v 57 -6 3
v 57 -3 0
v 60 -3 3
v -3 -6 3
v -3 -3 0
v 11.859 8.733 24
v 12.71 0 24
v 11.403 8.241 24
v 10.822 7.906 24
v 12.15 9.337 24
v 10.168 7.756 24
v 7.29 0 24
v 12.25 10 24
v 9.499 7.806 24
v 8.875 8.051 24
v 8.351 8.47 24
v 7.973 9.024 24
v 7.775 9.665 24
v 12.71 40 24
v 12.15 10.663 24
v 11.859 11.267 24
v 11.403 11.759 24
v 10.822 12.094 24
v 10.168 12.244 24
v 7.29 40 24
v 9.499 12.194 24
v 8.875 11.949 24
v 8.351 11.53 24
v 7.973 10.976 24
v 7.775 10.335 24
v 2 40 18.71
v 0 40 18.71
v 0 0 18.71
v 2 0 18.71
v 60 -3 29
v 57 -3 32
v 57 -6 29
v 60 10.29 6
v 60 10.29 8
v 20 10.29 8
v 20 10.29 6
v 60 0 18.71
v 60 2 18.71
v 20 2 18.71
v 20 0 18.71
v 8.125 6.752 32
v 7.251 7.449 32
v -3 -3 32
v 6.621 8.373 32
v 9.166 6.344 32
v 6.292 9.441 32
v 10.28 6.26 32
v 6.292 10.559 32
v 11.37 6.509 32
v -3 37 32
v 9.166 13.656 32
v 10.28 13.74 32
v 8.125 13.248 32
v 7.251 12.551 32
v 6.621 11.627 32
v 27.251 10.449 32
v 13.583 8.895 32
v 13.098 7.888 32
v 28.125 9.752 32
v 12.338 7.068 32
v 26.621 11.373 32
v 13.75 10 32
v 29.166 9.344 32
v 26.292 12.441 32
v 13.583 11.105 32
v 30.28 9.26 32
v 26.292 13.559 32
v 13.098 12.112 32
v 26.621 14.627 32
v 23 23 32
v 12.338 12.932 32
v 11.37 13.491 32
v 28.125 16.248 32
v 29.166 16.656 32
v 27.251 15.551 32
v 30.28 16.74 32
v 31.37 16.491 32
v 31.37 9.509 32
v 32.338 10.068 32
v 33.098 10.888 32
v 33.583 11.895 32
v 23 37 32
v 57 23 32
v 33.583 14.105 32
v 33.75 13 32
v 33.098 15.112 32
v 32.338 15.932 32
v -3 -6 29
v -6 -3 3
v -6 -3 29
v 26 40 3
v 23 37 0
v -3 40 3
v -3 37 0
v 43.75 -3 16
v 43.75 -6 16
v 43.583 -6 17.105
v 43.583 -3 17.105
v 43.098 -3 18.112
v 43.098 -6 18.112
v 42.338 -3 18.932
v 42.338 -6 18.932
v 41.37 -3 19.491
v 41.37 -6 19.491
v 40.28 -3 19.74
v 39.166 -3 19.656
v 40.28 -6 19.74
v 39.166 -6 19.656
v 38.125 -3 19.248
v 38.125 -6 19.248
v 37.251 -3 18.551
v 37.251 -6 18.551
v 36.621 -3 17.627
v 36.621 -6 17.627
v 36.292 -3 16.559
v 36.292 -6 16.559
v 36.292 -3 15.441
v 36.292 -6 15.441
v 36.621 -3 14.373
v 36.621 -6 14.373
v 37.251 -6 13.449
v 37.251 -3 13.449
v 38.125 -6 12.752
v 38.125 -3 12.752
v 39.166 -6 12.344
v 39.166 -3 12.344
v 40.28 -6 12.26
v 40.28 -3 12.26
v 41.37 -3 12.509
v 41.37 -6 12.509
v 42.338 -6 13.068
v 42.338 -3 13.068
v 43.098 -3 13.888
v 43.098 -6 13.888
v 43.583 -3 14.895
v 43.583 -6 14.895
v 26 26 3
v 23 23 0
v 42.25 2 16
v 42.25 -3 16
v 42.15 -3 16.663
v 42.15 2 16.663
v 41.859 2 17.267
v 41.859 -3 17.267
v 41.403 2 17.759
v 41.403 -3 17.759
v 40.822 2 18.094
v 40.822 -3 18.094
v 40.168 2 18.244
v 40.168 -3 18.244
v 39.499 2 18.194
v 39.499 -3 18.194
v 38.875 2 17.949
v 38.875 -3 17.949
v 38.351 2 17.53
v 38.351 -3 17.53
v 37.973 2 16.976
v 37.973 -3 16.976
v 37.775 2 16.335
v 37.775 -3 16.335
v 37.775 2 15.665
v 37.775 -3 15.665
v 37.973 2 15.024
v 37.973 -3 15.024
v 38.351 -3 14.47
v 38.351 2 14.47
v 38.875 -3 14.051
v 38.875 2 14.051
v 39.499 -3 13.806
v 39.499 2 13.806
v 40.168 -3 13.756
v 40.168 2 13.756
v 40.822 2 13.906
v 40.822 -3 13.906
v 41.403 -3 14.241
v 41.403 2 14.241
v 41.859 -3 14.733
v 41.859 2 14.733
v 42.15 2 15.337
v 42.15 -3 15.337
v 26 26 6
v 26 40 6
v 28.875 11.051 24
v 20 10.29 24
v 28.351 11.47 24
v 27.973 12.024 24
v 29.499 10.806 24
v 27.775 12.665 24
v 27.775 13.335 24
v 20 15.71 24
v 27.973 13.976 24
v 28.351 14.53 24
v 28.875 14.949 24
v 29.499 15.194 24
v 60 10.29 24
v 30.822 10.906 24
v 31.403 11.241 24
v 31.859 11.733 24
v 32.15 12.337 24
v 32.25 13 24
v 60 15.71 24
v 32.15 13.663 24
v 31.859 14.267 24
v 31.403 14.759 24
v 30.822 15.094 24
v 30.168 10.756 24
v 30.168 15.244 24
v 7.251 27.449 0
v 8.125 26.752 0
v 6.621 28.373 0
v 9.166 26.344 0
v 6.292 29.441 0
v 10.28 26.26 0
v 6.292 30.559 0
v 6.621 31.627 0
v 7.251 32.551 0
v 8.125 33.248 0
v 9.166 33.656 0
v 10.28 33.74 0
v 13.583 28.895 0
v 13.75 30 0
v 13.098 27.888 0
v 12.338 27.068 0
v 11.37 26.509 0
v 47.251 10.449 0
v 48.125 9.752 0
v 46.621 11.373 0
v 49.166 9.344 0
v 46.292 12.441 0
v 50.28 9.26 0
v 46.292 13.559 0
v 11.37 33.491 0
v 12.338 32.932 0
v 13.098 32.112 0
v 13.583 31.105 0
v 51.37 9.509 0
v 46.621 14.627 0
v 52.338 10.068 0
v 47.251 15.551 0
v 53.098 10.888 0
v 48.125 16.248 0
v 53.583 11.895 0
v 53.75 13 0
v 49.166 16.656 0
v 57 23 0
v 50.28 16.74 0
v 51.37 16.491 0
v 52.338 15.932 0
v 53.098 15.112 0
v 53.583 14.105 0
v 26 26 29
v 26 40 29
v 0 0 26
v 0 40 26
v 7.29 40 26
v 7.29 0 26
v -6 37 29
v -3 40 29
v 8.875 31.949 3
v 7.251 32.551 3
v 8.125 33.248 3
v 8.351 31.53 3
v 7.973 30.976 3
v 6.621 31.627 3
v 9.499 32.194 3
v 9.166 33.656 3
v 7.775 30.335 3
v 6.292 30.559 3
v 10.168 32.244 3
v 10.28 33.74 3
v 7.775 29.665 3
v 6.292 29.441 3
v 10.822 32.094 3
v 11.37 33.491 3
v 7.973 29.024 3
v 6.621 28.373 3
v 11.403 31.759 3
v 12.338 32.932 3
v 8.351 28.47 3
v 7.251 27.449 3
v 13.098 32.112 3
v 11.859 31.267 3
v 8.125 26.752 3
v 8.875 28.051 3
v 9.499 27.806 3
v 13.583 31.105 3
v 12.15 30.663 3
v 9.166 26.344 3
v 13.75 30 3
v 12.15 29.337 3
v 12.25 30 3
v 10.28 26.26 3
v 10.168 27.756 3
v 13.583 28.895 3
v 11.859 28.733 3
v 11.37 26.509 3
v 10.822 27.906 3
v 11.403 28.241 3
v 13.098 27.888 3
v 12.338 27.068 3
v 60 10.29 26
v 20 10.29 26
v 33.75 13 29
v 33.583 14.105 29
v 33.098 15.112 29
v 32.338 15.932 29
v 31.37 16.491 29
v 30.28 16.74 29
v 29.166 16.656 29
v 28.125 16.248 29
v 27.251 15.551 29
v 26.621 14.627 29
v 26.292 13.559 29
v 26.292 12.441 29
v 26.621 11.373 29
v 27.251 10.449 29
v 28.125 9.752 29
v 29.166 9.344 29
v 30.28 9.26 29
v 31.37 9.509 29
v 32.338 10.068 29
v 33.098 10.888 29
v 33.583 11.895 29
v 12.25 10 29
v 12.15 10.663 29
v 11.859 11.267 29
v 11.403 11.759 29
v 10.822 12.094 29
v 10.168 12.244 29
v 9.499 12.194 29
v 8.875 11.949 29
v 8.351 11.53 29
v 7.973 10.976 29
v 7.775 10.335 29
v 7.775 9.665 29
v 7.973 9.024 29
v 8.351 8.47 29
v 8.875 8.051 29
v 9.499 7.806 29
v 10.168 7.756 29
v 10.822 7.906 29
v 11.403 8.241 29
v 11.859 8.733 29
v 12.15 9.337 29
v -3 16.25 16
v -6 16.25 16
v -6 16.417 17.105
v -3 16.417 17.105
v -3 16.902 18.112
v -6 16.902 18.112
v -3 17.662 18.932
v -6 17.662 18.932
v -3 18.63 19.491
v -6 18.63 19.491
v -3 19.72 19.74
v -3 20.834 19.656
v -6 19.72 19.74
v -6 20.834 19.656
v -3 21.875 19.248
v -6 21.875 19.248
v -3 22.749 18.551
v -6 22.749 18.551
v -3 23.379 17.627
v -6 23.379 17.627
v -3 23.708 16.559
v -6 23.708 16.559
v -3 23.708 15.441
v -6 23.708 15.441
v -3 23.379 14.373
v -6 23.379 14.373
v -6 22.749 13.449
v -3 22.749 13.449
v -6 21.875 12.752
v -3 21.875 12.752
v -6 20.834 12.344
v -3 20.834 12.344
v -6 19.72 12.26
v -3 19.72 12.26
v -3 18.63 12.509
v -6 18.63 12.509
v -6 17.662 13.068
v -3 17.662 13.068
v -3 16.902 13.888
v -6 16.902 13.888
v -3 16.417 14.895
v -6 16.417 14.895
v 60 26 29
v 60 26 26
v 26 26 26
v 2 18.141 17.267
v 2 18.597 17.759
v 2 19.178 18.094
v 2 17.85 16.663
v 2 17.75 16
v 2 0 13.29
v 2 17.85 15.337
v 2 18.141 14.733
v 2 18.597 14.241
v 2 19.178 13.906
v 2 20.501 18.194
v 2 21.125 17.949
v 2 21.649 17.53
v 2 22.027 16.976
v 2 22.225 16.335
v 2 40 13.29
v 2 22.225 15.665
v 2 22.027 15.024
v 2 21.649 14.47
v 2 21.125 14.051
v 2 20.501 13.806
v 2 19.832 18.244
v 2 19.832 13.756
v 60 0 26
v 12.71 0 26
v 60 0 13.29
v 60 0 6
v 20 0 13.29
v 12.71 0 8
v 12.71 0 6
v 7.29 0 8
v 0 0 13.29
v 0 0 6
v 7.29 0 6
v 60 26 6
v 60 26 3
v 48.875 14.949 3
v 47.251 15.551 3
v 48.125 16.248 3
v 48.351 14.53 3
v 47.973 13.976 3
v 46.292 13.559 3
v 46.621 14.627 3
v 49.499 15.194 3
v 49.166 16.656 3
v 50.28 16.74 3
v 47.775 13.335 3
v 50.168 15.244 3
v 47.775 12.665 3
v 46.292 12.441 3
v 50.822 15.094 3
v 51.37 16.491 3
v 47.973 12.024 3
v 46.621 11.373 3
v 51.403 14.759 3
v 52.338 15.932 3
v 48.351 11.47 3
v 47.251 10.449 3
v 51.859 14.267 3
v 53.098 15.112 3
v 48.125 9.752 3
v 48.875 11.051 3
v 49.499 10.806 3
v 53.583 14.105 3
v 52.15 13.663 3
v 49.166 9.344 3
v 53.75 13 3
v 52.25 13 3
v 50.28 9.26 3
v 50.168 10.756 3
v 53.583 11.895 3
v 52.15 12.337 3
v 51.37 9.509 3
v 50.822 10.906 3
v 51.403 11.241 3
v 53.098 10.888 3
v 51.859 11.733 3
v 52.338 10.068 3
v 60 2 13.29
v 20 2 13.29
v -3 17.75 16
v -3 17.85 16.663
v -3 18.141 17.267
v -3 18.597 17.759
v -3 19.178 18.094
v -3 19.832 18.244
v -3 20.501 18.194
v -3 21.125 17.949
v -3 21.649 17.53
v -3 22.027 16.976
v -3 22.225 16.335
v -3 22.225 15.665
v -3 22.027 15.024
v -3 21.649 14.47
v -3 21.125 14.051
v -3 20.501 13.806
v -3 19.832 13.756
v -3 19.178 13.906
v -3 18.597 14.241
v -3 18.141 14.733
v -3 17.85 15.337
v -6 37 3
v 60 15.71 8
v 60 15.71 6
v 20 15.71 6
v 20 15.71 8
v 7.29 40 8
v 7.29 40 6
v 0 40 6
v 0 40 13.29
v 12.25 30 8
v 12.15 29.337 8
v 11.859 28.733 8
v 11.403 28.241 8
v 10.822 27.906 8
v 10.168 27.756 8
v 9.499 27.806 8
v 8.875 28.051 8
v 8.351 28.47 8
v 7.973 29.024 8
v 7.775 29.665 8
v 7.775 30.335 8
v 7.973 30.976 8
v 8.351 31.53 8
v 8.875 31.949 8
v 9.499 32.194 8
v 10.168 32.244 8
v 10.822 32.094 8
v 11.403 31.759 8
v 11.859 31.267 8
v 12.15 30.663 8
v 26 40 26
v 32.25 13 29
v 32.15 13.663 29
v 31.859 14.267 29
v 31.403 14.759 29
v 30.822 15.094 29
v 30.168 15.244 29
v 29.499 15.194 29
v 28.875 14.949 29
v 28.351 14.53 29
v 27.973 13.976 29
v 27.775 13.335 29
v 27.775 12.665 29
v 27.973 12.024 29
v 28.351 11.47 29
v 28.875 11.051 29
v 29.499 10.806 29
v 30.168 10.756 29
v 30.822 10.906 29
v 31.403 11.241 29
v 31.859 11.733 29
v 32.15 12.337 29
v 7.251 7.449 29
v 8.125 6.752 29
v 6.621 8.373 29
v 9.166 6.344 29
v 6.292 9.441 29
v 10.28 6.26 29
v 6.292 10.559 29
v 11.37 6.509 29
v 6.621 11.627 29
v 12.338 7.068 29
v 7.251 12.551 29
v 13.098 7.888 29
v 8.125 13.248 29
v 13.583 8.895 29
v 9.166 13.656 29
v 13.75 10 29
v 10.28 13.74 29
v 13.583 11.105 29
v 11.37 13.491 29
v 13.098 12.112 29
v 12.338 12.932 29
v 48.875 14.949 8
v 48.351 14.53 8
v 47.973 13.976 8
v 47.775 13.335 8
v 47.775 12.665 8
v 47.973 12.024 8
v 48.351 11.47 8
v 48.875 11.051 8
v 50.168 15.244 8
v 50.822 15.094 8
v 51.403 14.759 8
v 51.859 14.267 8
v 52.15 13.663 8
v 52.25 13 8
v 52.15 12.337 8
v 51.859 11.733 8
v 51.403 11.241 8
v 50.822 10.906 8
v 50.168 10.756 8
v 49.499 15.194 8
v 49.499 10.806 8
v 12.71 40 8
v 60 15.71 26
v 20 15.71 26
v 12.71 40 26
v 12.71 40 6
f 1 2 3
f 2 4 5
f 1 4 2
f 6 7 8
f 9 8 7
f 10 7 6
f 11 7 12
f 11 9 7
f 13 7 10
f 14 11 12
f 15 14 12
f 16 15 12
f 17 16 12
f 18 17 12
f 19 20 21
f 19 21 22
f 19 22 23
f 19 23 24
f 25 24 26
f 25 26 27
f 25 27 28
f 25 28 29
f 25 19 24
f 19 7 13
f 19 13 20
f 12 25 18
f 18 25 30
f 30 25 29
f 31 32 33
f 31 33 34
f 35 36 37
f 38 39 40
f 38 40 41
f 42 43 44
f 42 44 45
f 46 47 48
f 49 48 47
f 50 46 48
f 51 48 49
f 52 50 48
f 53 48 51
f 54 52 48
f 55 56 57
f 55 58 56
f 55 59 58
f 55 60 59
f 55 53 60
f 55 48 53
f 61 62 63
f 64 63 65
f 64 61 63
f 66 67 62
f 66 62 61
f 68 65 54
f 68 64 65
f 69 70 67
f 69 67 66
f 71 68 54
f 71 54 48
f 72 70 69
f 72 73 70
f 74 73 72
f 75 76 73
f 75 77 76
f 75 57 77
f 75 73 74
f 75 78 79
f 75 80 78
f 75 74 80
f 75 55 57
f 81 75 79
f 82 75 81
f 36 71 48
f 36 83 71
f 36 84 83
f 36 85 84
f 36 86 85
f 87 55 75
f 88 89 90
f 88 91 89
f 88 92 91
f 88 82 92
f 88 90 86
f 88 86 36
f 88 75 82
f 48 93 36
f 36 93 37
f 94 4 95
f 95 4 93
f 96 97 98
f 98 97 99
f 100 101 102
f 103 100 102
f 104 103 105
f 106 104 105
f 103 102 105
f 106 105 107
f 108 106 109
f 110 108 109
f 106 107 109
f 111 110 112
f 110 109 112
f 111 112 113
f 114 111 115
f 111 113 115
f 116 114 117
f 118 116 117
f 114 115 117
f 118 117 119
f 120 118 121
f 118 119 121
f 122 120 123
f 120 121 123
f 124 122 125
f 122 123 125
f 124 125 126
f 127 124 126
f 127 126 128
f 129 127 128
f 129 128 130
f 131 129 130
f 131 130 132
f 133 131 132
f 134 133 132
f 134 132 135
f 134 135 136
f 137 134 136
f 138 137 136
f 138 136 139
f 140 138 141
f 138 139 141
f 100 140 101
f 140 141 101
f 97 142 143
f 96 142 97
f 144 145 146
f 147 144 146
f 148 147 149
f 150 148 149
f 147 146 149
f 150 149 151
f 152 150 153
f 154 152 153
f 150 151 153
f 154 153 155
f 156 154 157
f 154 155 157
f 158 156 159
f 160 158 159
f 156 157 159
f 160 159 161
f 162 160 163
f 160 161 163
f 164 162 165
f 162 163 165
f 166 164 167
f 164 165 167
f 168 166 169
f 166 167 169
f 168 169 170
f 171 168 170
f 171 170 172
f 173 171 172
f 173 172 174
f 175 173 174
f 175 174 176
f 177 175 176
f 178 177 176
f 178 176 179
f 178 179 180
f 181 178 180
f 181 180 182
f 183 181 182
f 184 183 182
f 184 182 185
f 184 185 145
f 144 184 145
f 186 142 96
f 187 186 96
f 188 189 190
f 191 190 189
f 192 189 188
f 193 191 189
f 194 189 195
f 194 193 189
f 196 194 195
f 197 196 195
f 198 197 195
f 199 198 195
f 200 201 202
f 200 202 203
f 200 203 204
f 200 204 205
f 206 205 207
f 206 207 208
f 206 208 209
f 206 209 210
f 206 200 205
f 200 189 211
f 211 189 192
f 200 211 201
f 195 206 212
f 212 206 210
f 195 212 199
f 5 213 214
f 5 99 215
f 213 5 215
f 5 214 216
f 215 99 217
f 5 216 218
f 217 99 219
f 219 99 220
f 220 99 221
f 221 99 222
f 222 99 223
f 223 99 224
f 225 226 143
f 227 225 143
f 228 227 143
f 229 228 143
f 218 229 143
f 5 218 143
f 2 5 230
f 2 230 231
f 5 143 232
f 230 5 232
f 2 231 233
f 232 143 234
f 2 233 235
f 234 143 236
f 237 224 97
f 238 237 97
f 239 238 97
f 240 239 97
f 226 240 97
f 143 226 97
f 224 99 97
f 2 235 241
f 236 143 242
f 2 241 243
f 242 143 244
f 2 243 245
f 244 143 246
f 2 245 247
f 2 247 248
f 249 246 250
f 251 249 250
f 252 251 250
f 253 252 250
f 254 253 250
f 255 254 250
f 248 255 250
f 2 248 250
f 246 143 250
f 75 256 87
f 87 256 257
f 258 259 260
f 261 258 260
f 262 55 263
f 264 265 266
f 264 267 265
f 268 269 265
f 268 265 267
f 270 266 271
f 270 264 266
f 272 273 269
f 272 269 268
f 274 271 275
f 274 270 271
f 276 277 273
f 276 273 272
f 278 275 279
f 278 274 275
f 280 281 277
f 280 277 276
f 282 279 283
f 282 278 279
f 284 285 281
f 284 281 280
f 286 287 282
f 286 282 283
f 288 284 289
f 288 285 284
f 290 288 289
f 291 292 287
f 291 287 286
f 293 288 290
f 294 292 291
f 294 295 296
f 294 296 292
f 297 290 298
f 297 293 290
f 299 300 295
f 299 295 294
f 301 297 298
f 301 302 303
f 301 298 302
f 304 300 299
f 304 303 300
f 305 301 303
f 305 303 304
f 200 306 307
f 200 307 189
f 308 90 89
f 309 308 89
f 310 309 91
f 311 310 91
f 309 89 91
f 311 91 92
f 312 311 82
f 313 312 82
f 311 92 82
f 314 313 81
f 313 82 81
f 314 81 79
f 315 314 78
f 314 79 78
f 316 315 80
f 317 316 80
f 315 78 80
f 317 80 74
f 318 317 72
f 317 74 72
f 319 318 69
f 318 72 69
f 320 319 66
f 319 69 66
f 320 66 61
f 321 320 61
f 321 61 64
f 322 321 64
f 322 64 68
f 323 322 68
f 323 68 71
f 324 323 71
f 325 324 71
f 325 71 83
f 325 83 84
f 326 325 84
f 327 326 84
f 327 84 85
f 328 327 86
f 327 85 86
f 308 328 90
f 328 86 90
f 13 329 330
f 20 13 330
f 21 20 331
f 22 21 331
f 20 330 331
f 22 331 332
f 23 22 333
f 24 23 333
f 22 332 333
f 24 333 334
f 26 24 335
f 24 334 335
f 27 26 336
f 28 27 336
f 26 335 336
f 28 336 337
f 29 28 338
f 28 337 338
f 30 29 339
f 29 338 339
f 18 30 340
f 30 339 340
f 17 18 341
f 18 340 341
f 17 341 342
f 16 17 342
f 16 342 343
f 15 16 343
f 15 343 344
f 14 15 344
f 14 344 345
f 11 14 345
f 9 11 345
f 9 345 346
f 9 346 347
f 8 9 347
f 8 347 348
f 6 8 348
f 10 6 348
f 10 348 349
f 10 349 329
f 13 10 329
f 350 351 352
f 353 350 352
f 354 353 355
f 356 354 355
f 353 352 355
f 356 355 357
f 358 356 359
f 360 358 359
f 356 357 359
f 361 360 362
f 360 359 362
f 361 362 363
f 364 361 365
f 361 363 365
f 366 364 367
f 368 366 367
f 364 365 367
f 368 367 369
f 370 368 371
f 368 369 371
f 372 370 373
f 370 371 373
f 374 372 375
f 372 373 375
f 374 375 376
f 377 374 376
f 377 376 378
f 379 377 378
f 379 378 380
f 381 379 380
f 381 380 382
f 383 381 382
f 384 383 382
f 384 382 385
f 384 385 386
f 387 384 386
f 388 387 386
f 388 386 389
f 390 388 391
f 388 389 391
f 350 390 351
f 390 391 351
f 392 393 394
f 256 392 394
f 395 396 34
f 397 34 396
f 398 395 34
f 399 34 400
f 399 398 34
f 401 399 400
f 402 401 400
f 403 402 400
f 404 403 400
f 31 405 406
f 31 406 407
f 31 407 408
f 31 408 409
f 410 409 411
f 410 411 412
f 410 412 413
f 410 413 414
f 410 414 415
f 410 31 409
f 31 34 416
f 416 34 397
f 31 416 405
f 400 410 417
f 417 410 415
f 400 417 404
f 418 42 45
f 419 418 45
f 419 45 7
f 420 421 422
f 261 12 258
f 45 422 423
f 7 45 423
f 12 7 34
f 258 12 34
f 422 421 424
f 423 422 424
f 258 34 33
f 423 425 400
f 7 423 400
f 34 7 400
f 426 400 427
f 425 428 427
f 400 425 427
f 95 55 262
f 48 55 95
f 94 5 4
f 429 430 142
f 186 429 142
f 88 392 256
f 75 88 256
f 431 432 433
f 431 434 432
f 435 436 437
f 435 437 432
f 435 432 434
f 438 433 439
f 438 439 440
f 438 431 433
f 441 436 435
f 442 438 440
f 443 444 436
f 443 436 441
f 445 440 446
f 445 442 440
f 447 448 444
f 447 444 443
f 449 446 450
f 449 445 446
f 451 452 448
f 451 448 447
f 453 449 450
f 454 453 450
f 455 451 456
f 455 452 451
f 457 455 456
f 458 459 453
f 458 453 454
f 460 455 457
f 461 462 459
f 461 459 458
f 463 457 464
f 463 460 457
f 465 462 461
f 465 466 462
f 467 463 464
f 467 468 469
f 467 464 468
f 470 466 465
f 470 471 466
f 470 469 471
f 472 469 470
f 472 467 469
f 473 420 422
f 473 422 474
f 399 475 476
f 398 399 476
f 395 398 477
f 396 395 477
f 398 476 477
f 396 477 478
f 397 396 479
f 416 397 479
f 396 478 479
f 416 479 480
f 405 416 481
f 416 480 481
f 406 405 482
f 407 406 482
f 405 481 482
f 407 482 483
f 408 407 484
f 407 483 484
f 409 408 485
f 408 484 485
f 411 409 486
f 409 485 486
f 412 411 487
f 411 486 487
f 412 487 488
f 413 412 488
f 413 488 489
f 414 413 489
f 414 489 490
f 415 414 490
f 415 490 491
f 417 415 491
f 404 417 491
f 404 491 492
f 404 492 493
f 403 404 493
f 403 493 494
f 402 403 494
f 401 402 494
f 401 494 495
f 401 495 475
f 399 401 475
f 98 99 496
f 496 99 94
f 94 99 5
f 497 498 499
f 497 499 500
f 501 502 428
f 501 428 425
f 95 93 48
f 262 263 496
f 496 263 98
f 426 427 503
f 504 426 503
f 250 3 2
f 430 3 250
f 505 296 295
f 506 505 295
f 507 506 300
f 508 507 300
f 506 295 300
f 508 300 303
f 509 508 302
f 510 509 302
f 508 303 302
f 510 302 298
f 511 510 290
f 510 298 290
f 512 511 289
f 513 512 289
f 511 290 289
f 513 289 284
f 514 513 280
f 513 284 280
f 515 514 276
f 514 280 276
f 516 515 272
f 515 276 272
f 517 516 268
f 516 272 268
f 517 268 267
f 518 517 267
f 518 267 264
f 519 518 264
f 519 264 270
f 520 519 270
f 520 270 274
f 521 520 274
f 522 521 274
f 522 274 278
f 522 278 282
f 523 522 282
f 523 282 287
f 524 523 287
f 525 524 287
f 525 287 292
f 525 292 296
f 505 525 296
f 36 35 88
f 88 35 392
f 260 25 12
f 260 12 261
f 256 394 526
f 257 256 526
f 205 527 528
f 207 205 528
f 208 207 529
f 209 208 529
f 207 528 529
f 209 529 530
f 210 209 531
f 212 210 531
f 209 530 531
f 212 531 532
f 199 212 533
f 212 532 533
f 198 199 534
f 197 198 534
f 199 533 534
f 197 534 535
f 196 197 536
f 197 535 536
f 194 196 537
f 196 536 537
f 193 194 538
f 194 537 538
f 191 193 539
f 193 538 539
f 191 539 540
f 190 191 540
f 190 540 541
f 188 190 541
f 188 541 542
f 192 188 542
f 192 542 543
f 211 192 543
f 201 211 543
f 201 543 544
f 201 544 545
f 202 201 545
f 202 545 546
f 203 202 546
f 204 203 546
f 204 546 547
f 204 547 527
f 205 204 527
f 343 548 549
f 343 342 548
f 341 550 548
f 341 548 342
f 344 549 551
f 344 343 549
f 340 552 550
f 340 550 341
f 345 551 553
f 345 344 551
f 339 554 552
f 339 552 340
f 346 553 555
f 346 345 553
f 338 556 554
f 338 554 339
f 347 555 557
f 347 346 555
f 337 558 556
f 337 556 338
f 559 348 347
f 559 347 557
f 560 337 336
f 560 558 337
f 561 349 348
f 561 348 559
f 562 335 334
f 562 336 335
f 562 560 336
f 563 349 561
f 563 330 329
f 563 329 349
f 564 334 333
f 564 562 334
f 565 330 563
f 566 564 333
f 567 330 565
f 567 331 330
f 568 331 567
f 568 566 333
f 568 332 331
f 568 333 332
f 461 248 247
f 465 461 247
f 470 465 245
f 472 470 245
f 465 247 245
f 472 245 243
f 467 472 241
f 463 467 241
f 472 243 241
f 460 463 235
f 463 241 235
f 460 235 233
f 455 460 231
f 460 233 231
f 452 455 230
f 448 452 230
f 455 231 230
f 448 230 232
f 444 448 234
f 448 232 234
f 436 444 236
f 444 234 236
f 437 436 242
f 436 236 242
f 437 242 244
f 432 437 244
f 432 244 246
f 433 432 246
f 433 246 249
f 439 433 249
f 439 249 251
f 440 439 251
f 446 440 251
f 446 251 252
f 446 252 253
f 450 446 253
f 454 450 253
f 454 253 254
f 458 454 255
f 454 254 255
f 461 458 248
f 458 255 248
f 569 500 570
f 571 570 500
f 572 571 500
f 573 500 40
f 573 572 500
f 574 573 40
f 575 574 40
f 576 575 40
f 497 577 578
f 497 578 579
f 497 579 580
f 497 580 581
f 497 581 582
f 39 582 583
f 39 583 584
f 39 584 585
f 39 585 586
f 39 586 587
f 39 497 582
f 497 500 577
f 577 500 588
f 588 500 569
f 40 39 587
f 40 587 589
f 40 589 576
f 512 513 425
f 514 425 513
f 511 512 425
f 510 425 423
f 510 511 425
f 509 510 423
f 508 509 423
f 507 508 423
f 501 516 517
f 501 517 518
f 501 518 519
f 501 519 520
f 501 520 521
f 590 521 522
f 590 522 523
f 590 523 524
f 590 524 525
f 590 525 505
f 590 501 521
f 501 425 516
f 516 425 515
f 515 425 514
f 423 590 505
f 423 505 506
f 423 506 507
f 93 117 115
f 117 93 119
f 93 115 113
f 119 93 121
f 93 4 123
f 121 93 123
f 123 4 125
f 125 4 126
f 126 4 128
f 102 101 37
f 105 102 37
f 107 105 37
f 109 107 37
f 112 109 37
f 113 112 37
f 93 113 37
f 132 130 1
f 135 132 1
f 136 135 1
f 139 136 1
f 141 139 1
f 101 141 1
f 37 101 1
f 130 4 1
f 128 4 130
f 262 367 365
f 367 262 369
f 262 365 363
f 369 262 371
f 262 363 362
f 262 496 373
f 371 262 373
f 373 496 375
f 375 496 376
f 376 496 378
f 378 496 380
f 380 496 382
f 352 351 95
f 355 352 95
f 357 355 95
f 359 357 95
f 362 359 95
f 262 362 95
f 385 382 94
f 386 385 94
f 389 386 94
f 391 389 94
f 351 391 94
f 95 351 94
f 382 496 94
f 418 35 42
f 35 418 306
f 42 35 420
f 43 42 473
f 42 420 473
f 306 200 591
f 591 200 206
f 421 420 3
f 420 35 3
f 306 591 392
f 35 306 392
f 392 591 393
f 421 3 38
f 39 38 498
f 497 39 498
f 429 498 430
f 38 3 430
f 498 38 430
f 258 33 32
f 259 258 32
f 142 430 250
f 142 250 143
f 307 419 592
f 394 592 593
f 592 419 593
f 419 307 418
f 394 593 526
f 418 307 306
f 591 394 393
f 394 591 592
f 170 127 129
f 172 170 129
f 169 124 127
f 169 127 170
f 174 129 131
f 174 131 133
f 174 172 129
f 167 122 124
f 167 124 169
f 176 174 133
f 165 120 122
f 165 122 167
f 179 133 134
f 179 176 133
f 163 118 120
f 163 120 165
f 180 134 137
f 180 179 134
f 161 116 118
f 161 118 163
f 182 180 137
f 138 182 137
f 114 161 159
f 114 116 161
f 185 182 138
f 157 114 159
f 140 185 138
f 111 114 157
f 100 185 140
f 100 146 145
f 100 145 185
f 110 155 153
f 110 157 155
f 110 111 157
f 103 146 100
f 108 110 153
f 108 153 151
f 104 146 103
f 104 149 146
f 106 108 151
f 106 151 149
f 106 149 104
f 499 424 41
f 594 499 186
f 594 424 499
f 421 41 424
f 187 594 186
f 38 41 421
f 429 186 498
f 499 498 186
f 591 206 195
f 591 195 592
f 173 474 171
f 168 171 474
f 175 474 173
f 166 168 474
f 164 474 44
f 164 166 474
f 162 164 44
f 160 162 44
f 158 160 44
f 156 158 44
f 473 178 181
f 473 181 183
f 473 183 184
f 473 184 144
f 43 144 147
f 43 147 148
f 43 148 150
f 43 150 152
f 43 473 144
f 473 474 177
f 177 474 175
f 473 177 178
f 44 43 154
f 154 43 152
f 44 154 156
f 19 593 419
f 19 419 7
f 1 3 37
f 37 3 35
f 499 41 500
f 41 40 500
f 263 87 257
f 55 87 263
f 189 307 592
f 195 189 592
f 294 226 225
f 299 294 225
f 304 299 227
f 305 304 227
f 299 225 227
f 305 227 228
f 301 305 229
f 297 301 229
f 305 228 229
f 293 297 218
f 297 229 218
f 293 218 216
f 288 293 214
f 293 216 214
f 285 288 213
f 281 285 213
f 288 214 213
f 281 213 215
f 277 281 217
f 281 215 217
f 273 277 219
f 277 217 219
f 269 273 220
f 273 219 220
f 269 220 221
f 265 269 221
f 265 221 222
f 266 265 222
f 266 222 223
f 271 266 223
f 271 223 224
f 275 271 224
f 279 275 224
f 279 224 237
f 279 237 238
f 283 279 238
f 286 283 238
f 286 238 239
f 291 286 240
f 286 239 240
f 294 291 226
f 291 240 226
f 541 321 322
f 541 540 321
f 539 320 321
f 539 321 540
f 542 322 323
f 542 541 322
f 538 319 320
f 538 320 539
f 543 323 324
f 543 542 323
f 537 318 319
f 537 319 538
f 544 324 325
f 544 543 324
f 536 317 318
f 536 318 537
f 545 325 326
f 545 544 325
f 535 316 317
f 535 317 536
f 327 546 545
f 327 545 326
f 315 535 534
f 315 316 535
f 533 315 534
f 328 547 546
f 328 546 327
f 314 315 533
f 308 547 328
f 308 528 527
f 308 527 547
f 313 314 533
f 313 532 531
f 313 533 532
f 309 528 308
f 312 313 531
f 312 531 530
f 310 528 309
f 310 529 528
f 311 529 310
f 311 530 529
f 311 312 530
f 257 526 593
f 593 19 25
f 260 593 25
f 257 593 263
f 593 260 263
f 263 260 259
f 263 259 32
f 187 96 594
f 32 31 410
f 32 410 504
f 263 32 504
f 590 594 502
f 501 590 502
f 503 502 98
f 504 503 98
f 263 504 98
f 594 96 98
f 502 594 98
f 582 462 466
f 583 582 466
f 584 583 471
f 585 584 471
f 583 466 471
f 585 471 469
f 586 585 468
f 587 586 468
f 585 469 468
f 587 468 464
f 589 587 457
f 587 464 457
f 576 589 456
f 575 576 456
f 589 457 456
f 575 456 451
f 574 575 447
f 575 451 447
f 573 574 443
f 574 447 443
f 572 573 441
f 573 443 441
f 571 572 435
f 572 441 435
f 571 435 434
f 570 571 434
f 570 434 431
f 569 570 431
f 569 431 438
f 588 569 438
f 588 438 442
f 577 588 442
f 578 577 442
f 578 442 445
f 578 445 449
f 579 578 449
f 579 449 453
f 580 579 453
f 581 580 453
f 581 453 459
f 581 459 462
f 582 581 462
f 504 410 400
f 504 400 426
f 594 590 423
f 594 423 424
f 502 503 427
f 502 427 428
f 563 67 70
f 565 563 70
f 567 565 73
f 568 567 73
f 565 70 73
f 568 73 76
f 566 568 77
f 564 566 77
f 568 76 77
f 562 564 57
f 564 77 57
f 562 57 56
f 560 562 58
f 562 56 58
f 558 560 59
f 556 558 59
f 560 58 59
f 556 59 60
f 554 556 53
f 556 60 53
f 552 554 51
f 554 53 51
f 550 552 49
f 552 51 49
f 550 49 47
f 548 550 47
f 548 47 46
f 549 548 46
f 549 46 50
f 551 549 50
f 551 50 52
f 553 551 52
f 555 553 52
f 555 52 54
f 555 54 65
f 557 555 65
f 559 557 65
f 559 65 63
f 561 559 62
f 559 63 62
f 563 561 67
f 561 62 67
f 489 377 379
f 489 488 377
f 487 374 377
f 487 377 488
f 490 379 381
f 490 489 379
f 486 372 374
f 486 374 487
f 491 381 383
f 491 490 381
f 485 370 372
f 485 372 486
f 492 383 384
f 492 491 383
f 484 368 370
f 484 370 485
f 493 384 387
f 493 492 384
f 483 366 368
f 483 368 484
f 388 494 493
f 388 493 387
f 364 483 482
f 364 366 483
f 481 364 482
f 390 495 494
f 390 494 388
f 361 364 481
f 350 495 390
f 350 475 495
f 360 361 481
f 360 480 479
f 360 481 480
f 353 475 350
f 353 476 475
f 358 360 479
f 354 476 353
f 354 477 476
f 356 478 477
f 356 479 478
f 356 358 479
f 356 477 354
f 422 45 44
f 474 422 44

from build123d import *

# Parameters (mm, degrees)
F1_DEPTH  = 6
F3_DEPTH  = 20
F5_DEPTH  = 6
F7_DEPTH  = 40
F9_DEPTH  = 40
F10_R     = 2.25
F11_DEPTH = 8
F12_R     = 2.25
F13_DEPTH = 8
F14_R     = 2.25
F15_DEPTH = 8
F16_R     = 2.25
F17_DEPTH = 8
F18_R     = 3.75
F19_DEPTH = 3
F20_R     = 3.75
F21_DEPTH = 3
F22_R     = 3.75
F23_DEPTH = 3
F24_R     = 3.75
F25_DEPTH = 3
F26_SIZE  = 3


with BuildPart() as f1:
    # F0 (on Top) → F1 (new body)
    with BuildSketch(Plane.XY):
        Polygon((26, 40), (3.85853, 40), (-6, 40), (-6, -6), (60, -6), (60, 26), (26, 26), align=None)
    extrude(amount=F1_DEPTH)

    # F2 (on face) → F3 (join)
    with BuildSketch(Plane.XY.offset(6)):
        Polygon((0, 40), (-6, 40), (-6, -6), (60, -6), (60, 0), (0, 0), align=None)
    extrude(amount=F3_DEPTH)

    # F4 (on face) → F5 (join)
    with BuildSketch(Plane.XY.offset(26)):
        Polygon((-6, 40), (-6, -6), (60, -6), (60, 26), (26, 26), (26, 40), align=None)
    extrude(amount=F5_DEPTH)

    # F6 (on face) → F7 (join)
    with BuildSketch(Plane.YZ.offset(60)):
        Polygon((15.71, 26), (13, 26), (10.29, 26), (10.29, 24), (15.71, 24), align=None)
        Polygon((10.29, 6), (13, 6), (15.71, 6), (15.71, 8), (10.29, 8), align=None)
        Polygon((0, 18.71), (0, 16), (0, 13.29), (2, 13.29), (2, 18.71), align=None)
    extrude(amount=-F7_DEPTH)

    # F8 (on face) → F9 (join)
    with BuildSketch(Plane(origin=(0, 40, 0), x_dir=(-1, 0, 0), z_dir=(0, 1, 0))):
        Polygon((0, 13.29), (0, 16), (0, 18.71), (-2, 18.71), (-2, 13.29), align=None)
        Polygon((-7.29, 26), (-10, 26), (-12.71, 26), (-12.71, 24), (-7.29, 24), align=None)
        Polygon((-12.71, 6), (-10, 6), (-7.29, 6), (-7.29, 8), (-12.71, 8), align=None)
    extrude(amount=-F9_DEPTH)

    # F10 (on face) → F11 (cut, through all)
    with BuildSketch(Plane(origin=(0, 0, 0), x_dir=(1, 0, 0), z_dir=(0, 0, -1))):
        with Locations((50, -13)):
            Circle(F10_R)
        with Locations((10, -30)):
            Circle(F10_R)
    extrude(amount=-F11_DEPTH, mode=Mode.SUBTRACT)

    # F12 (on face) → F13 (cut, through all)
    with BuildSketch(Plane.XY.offset(32)):
        with Locations((10, 10)):
            Circle(F12_R)
        with Locations((30, 13)):
            Circle(F12_R)
    extrude(amount=-F13_DEPTH, mode=Mode.SUBTRACT)

    # F14 (on face) → F15 (cut, through all)
    with BuildSketch(Plane.XZ.offset(6)):
        with Locations((40, 16)):
            Circle(F14_R)
    extrude(amount=-F15_DEPTH, mode=Mode.SUBTRACT)

    # F16 (on face) → F17 (cut, through all)
    with BuildSketch(Plane(origin=(-6, 0, 0), x_dir=(0, -1, 0), z_dir=(-1, 0, 0))):
        with Locations((-20, 16)):
            Circle(F16_R)
    extrude(amount=-F17_DEPTH, mode=Mode.SUBTRACT)

    # F18 (on face) → F19 (cut)
    with BuildSketch(Plane.XY.offset(32)):
        with Locations((10, 10)):
            Circle(F18_R)
        with Locations((30, 13)):
            Circle(F18_R)
    extrude(amount=-F19_DEPTH, mode=Mode.SUBTRACT)

    # F20 (on face) → F21 (cut)
    with BuildSketch(Plane(origin=(-6, 0, 0), x_dir=(0, -1, 0), z_dir=(-1, 0, 0))):
        with Locations((-20, 16)):
            Circle(F20_R)
    extrude(amount=-F21_DEPTH, mode=Mode.SUBTRACT)

    # F22 (on face) → F23 (cut)
    with BuildSketch(Plane(origin=(0, 0, 0), x_dir=(1, 0, 0), z_dir=(0, 0, -1))):
        with Locations((10, -30)):
            Circle(F22_R)
        with Locations((50, -13)):
            Circle(F22_R)
    extrude(amount=-F23_DEPTH, mode=Mode.SUBTRACT)

    # F24 (on face) → F25 (cut)
    with BuildSketch(Plane.XZ.offset(6)):
        with Locations((40, 16)):
            Circle(F24_R)
    extrude(amount=-F25_DEPTH, mode=Mode.SUBTRACT)

    # F26
    f26_edges = [f1.edges().sort_by_distance(p)[0] for p in [
        (27, -6, 0),
        (43, 26, 0),
        (26, 33, 0),
        (10, 40, 0),
        (-6, 17, 0),
        (-6, -6, 16),
        (27, -6, 32),
        (-6, 17, 32),
        (10, 40, 32),
        (26, 33, 32),
        (43, 26, 32),
        (60, 10, 32),
        (60, 10, 0),
        (-6, 40, 16),
        (60, -6, 16),
    ]]
    chamfer(f26_edges, length=F26_SIZE)


solid = f1.part
